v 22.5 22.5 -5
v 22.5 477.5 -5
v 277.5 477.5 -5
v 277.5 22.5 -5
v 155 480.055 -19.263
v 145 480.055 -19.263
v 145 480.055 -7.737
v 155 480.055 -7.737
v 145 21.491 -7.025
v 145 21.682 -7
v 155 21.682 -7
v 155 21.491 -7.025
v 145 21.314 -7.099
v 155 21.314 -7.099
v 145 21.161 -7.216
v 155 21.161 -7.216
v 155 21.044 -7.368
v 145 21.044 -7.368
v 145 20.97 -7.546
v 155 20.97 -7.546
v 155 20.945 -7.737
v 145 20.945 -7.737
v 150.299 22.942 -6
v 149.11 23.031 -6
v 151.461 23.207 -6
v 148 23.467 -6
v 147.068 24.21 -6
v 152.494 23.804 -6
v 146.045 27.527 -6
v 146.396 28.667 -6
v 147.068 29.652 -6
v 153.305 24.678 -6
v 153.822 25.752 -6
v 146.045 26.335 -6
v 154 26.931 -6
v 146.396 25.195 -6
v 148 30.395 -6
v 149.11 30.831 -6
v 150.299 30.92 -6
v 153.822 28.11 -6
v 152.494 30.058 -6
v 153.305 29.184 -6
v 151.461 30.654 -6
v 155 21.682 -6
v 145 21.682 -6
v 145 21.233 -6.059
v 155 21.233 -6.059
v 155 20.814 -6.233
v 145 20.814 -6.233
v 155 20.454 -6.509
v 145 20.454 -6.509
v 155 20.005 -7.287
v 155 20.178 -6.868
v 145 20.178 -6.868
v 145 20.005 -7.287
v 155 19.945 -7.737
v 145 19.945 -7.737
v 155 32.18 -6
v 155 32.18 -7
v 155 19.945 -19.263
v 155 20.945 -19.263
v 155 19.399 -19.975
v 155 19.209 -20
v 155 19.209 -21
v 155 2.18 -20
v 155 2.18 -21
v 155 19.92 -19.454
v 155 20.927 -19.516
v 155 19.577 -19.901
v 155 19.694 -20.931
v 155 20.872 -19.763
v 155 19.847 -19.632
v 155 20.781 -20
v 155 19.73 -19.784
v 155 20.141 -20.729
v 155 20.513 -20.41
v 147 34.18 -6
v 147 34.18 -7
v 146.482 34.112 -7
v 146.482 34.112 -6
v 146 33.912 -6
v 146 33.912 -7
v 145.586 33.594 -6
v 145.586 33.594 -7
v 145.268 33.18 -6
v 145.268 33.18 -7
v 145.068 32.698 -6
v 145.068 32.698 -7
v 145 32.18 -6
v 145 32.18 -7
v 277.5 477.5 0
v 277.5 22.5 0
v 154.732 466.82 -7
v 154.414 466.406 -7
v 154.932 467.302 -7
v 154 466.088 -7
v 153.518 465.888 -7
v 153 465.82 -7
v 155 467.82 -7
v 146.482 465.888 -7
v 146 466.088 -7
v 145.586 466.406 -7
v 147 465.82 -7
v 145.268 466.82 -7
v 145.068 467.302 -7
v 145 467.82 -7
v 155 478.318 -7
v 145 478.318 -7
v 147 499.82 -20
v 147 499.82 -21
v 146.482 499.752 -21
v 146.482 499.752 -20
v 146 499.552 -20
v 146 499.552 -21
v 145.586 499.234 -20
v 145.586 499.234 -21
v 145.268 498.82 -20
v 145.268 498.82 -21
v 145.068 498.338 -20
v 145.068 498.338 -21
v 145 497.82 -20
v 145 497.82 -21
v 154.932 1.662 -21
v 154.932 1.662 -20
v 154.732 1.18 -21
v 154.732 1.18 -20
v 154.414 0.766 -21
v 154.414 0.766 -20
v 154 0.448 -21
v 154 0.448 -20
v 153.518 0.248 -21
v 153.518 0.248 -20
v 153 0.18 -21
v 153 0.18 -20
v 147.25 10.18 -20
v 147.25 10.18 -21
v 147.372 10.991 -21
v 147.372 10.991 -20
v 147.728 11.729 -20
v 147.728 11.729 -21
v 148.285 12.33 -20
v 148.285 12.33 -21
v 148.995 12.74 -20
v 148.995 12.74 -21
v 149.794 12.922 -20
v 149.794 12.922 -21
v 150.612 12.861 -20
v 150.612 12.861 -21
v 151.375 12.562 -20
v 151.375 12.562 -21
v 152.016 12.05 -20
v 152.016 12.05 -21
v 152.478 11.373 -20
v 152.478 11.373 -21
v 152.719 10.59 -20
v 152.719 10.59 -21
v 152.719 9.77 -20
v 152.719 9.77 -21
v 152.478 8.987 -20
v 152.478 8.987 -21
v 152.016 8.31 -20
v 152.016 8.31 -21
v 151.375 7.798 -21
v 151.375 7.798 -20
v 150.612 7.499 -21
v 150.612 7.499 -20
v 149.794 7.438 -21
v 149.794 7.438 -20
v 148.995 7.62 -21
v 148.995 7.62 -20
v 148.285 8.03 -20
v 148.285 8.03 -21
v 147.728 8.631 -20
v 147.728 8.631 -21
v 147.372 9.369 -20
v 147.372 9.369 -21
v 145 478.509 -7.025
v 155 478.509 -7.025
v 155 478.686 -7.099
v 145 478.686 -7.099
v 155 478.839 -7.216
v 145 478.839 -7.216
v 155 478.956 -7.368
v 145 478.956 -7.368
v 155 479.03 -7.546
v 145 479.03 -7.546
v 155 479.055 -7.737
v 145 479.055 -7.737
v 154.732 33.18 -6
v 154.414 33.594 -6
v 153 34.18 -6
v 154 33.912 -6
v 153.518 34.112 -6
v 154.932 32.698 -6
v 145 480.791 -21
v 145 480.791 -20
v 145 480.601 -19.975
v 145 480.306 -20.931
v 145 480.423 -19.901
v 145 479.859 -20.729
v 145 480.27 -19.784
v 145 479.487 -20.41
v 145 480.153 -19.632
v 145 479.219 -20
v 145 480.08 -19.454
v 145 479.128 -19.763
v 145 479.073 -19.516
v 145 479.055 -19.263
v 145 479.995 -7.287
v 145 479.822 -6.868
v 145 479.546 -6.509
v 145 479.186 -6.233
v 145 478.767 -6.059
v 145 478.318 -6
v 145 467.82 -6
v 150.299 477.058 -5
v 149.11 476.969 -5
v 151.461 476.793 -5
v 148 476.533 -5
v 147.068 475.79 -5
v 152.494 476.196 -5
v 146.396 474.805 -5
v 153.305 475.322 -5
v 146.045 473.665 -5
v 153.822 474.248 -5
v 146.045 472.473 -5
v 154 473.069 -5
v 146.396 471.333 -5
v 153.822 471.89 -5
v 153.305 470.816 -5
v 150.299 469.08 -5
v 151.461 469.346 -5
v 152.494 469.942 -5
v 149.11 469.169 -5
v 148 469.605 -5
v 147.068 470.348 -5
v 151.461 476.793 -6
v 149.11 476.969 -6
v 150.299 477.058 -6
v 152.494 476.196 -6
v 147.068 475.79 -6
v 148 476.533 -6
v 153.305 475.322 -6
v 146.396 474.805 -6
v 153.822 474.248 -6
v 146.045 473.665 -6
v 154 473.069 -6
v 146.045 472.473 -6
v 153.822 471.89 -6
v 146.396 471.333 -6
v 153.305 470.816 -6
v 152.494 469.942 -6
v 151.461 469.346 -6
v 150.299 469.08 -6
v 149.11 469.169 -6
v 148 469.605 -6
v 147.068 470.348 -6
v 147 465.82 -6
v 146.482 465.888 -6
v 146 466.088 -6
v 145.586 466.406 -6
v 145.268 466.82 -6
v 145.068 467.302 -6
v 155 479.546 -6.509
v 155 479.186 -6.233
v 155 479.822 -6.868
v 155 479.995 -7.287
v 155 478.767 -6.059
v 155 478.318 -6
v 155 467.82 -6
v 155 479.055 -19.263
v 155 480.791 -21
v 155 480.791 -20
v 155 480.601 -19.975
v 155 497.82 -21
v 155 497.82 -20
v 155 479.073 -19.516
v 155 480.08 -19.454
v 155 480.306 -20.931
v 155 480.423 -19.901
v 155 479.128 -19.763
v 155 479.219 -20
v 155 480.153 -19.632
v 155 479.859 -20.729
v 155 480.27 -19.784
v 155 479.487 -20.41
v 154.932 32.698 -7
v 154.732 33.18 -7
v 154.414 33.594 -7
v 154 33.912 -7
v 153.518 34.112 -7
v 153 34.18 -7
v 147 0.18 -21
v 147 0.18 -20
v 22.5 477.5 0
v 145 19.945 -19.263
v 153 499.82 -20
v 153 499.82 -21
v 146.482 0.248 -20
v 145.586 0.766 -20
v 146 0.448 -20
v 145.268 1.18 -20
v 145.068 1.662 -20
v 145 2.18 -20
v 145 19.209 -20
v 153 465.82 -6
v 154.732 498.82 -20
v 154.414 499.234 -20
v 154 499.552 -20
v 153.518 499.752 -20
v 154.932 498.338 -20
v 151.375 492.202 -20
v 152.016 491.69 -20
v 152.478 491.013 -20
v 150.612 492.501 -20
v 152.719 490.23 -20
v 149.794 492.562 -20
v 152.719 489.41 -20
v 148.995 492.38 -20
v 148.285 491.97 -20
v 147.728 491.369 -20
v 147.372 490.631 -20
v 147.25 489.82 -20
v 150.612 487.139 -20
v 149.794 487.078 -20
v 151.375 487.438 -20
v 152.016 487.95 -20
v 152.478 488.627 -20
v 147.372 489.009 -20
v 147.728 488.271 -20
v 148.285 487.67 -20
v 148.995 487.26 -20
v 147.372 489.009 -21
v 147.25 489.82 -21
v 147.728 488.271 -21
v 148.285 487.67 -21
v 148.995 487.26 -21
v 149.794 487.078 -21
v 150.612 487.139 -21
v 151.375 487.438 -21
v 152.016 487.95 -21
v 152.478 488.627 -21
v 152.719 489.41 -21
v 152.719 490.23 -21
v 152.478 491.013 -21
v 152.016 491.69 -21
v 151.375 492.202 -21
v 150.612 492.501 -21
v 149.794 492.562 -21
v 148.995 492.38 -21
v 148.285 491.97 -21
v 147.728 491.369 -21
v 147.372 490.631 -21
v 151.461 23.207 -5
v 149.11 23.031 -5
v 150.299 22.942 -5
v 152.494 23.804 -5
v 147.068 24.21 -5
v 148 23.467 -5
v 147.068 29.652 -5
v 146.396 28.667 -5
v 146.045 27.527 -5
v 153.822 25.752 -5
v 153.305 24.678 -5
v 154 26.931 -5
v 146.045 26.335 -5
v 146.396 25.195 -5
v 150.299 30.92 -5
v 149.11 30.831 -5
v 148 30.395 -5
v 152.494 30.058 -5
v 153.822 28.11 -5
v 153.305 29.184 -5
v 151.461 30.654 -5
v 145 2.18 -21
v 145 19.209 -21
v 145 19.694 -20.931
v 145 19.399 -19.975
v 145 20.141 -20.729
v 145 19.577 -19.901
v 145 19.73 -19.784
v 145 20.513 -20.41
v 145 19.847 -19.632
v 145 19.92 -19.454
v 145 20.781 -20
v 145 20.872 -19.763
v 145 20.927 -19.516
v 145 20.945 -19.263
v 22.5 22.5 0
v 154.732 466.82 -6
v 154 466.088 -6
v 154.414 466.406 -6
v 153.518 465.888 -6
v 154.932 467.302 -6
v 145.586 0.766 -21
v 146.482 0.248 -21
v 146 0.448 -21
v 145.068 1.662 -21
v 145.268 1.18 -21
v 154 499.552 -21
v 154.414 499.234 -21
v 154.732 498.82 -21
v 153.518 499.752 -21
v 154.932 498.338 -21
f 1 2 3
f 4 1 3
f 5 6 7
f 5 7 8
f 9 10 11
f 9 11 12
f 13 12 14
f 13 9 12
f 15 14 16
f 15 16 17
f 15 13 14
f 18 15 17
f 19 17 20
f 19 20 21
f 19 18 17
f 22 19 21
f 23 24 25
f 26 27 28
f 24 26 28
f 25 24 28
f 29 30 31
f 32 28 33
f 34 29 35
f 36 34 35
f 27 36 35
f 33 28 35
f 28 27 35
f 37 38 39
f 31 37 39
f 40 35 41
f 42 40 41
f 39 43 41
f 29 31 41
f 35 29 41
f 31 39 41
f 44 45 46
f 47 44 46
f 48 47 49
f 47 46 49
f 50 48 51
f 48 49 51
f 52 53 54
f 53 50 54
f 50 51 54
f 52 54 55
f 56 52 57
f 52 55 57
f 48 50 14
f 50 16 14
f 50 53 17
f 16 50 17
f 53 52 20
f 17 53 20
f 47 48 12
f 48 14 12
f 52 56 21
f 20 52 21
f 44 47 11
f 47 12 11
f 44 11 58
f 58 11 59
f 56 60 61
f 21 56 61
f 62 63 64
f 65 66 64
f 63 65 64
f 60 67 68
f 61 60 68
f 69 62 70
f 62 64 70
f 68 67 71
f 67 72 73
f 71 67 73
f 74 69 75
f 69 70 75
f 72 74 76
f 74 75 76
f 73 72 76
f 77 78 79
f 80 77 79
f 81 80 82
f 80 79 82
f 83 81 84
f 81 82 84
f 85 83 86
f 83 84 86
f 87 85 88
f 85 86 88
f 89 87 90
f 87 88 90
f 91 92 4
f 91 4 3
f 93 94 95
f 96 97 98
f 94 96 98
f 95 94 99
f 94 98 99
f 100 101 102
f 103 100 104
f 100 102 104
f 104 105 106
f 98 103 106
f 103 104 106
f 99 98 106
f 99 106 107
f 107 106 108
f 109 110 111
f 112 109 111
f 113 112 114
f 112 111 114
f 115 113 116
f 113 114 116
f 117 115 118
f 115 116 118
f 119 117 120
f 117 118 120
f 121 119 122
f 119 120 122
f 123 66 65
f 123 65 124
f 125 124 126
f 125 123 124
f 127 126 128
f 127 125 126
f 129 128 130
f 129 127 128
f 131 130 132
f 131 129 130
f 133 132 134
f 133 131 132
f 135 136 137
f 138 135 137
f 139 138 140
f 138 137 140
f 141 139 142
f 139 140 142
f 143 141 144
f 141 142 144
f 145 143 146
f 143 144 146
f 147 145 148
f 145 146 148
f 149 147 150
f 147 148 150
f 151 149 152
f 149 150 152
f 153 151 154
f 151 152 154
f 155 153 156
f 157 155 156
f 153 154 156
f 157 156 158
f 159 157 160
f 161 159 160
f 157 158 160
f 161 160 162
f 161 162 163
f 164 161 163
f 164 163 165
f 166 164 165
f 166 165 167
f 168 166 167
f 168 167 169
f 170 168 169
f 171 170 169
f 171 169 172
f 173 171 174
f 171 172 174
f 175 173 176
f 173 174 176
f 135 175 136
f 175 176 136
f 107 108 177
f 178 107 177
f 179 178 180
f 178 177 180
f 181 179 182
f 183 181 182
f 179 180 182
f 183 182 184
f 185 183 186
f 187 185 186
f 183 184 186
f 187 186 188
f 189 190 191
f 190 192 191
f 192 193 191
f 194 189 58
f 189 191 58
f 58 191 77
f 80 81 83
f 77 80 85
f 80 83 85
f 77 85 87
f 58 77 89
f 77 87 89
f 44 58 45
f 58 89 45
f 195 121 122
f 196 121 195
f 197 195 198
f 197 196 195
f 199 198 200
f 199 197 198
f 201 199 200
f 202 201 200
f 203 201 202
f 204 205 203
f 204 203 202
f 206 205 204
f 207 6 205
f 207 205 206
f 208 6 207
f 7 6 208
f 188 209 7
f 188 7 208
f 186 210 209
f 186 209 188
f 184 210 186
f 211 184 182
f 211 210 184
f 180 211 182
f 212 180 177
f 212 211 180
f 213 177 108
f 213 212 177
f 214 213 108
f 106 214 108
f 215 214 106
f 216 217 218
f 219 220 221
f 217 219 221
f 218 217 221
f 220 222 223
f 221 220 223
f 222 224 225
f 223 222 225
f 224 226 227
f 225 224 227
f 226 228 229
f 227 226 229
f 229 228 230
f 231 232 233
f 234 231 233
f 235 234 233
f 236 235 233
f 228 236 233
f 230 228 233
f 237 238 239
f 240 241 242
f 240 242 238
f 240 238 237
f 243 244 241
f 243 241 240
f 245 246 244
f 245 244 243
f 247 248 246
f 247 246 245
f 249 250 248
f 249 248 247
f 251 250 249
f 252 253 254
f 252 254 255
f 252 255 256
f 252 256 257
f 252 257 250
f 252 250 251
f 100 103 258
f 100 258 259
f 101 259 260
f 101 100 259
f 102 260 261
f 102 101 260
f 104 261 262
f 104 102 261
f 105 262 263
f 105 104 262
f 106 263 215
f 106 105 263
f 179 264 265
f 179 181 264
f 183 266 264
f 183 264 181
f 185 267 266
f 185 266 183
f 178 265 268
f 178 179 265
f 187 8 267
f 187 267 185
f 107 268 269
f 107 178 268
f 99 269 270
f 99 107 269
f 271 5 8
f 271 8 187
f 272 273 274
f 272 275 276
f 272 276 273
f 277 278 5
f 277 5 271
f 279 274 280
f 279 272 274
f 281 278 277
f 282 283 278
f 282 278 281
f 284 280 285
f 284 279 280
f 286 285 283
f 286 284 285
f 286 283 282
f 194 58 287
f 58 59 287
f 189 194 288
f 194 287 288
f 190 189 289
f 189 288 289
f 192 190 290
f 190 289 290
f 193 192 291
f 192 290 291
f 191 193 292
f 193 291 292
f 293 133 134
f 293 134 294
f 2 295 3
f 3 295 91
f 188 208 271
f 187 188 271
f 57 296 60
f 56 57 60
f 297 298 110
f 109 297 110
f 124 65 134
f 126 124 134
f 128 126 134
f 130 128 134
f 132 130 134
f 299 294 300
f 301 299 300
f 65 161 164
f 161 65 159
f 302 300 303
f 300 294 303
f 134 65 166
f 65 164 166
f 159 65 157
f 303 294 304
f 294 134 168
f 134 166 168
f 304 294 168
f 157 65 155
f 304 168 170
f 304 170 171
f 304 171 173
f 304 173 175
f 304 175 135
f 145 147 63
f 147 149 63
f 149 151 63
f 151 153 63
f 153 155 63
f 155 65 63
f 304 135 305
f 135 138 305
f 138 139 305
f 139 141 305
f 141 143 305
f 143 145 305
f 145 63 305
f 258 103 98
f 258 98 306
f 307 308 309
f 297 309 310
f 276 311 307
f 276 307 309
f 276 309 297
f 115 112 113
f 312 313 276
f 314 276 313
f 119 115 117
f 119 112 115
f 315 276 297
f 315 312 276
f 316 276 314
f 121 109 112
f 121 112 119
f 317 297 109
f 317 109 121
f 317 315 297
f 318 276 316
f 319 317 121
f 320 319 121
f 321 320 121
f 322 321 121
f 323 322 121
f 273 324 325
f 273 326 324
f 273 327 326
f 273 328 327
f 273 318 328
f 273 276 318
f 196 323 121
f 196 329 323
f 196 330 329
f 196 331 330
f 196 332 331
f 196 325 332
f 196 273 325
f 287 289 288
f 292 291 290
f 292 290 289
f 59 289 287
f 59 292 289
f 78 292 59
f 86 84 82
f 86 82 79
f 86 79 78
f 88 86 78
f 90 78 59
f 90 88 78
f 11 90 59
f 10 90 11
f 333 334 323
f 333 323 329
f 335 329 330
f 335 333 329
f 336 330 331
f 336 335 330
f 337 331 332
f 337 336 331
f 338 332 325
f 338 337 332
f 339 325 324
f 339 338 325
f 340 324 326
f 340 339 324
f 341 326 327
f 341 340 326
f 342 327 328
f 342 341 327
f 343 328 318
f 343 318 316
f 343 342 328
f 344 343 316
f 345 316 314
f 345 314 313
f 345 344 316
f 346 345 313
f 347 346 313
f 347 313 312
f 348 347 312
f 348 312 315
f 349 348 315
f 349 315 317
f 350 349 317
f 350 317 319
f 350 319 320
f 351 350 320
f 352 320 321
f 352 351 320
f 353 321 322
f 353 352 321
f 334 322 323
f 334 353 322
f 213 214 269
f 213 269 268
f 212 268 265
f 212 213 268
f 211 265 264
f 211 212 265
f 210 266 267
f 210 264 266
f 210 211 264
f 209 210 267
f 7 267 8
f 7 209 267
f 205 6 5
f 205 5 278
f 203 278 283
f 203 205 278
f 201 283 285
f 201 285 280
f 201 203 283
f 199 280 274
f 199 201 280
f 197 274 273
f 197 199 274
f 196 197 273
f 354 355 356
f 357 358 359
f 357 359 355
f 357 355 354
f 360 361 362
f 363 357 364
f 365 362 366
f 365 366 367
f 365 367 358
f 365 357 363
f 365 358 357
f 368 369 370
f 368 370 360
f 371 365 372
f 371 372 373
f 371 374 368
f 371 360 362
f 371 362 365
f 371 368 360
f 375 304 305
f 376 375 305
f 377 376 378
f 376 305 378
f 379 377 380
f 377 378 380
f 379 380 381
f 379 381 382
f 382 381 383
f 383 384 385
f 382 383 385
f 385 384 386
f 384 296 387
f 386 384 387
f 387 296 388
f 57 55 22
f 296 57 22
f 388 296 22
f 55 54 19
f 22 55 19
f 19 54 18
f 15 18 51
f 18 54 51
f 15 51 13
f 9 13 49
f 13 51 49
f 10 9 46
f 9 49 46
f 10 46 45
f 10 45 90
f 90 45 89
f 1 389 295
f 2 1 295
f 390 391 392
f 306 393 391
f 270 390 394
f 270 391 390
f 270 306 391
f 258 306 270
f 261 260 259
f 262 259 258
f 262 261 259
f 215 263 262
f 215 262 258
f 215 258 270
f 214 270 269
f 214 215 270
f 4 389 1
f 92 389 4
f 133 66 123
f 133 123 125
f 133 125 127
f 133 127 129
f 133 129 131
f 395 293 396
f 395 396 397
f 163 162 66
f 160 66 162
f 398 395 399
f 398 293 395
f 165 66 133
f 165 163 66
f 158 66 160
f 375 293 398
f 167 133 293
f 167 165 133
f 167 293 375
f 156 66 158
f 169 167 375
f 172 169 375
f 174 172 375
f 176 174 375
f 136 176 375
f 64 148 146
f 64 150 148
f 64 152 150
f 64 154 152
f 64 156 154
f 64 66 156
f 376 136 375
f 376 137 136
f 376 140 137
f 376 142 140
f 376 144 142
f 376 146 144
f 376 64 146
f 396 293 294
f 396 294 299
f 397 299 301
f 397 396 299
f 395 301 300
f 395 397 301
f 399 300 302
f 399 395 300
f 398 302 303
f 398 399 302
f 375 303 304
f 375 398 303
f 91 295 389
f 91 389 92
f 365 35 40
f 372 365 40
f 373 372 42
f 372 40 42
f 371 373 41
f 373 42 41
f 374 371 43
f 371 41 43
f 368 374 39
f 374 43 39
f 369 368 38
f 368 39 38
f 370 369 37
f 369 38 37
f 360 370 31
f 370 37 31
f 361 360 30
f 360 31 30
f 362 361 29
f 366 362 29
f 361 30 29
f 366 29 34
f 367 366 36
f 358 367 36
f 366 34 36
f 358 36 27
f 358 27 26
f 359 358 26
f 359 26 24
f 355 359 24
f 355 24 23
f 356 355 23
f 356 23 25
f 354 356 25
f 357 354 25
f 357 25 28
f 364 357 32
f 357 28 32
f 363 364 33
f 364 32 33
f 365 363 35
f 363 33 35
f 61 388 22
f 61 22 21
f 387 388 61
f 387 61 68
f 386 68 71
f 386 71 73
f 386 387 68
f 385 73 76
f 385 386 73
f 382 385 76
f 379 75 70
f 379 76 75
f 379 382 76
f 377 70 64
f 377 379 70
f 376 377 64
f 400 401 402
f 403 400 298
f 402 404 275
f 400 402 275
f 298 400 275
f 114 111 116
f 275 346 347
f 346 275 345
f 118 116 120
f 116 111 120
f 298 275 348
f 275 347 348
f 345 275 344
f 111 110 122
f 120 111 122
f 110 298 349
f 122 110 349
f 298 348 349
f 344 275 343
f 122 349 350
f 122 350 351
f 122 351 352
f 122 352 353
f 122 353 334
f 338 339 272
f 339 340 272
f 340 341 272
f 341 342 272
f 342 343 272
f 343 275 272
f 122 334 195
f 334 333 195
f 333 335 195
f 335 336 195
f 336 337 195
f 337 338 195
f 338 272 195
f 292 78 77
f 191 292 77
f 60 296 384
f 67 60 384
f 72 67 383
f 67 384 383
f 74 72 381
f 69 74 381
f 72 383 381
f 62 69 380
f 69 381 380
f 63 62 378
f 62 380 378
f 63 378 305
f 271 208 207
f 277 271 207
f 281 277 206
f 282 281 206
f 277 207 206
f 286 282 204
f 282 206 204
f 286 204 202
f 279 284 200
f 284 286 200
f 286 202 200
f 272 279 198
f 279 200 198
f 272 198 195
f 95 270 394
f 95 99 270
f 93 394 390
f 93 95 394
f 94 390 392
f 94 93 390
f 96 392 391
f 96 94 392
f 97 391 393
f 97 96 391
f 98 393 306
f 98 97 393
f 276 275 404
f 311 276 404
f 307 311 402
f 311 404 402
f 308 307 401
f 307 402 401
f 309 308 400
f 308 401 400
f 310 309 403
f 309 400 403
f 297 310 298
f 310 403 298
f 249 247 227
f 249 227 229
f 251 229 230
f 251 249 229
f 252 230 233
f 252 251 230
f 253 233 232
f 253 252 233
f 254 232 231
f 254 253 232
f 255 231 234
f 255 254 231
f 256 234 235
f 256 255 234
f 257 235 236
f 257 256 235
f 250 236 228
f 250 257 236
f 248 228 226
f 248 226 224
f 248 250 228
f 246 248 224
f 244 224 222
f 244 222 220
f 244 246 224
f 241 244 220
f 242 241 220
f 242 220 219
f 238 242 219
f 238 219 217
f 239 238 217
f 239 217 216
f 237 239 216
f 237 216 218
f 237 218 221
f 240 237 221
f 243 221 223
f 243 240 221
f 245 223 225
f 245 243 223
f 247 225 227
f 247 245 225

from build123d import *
from build123d.topology import SkipClean

# Parameters (mm, degrees)
SKETCH1_W           = 255
SKETCH1_H           = 455
BOSS_EXTRUDE1_DEPTH = 5
SKETCH2_R           = 2.75
BASE_FLANGE1_DEPTH  = 1
JOG1_START          = 145
JOG1_DEPTH          = 10
JOG1_START_2        = 147
JOG1_2_DEPTH        = 6
JOG1_START_3        = -7.7366
JOG1_3_DEPTH        = 1.716372919
JOG1_START_4        = -20
JOG1_4_OUTLINE_W    = 2
JOG1_4_OUTLINE_H    = 1
JOG1_4_DEPTH        = 12.381759831
JOG1_START_5        = -7
JOG1_5_DEPTH        = 1
JOG1_6_DEPTH        = 10
JOG1_7_DEPTH        = 10
SKETCH8_R           = 4
BOSS_EXTRUDE2_DEPTH = 1


with BuildPart() as part:
    # Sketch1 → Boss-Extrude1 (new body)
    with BuildSketch(Plane.XY):
        with Locations((150, 250)):
            Rectangle(SKETCH1_W, SKETCH1_H)
    extrude(amount=-BOSS_EXTRUDE1_DEPTH)


with BuildPart() as body_2:
    # Base-Flange1: sheet metal written as solids
    # Sketch2 → Base-Flange1 (new body)
    with BuildSketch(Plane(origin=(0, 0, -21), x_dir=(-1, 0, 0), z_dir=(0, 0, -1))):
        with BuildLine():
            Line((-153, 0.18), (-147, 0.18))
            ThreePointArc((-147, 0.18), (-145.585786438, 0.765786438), (-145, 2.18))
            Line((-145, 2.18), (-145, 32.18))
            ThreePointArc((-145, 32.18), (-145.585786438, 33.594213562), (-147, 34.18))
            Line((-147, 34.18), (-153, 34.18))
            ThreePointArc((-153, 34.18), (-154.414213562, 33.594213562), (-155, 32.18))
            Line((-155, 32.18), (-155, 2.18))
            ThreePointArc((-155, 2.18), (-154.414213562, 0.765786438), (-153, 0.18))
        make_face()
        with Locations((-150, 10.18)):
            Circle(SKETCH2_R, mode=Mode.SUBTRACT)
    extrude(amount=-BASE_FLANGE1_DEPTH)

    # Jog1: read off the stored shape, not the designer's step
    # Jog1 outline → Jog1 (cut)
    with BuildSketch(Plane.YZ.offset(JOG1_START)):
        with BuildLine():
            Line((34.18, -20), (20.781417721, -20))
            ThreePointArc((20.781417721, -20), (20.140602795, -20.728828115), (19.208776631, -21))
            Line((19.208776631, -21), (34.18, -21))
            Line((34.18, -21), (34.18, -20))
        make_face()
    extrude(amount=JOG1_DEPTH, mode=Mode.SUBTRACT)

    # Jog1 2 outline → Jog1 2 (add)
    with BuildSketch(Plane.YZ.offset(JOG1_START_2)):
        with BuildLine():
            ThreePointArc((20.781417721, -20), (20.903891388, -19.640713558), (20.945376631, -19.2634))
            Line((20.945376631, -19.2634), (20.945376631, -7.7366))
            ThreePointArc((20.945376631, -7.7366), (21.161121776, -7.215745145), (21.681976631, -7))
            Line((21.681976631, -7), (34.18, -7))
            Line((34.18, -7), (34.18, -6))
            Line((34.18, -6), (21.681976631, -6))
            ThreePointArc((21.681976631, -6), (20.454014995, -6.508638364), (19.945376631, -7.7366))
            Line((19.945376631, -7.7366), (19.945376631, -19.2634))
            ThreePointArc((19.945376631, -19.2634), (19.729631486, -19.784254855), (19.208776631, -20))
            Line((19.208776631, -20), (20.781417721, -20))
        make_face()
    extrude(amount=JOG1_2_DEPTH)

    # Jog1 3 outline → Jog1 3 (add)
    with BuildSketch(Plane.XY.offset(JOG1_START_3)):
        with BuildLine():
            Line((155, 19.945376631), (155, 32.18))
            ThreePointArc((155, 32.18), (154.414213562, 33.594213562), (153, 34.18))
            Line((153, 34.18), (153, 19.945376631))
            Line((153, 19.945376631), (155, 19.945376631))
        make_face()
        with BuildLine():
            Line((147, 19.945376631), (147, 34.18))
            ThreePointArc((147, 34.18), (145.585786438, 33.594213562), (145, 32.18))
            Line((145, 32.18), (145, 19.945376631))
            Line((145, 19.945376631), (147, 19.945376631))
        make_face()
    extrude(amount=JOG1_3_DEPTH)

    # Jog1 4 outline → Jog1 4 (add)
    with BuildSketch(Plane.XY.offset(JOG1_START_4)):
        with Locations((154, 20.445376631)):
            Rectangle(JOG1_4_OUTLINE_W, JOG1_4_OUTLINE_H)
        with Locations((146, 20.445376631)):
            Rectangle(JOG1_4_OUTLINE_W, JOG1_4_OUTLINE_H)
    extrude(amount=JOG1_4_DEPTH)

    # Jog1 5 outline → Jog1 5 (add)
    with BuildSketch(Plane.XY.offset(JOG1_START_5)):
        with BuildLine():
            Line((153, 20.945376631), (155, 20.945376631))
            Line((155, 20.945376631), (155, 32.18))
            ThreePointArc((155, 32.18), (154.414213562, 33.594213562), (153, 34.18))
            Line((153, 34.18), (153, 20.945376631))
        make_face()
        with BuildLine():
            Line((145, 20.945376631), (147, 20.945376631))
            Line((147, 20.945376631), (147, 34.18))
            ThreePointArc((147, 34.18), (145.585786438, 33.594213562), (145, 32.18))
            Line((145, 32.18), (145, 20.945376631))
        make_face()
    extrude(amount=JOG1_5_DEPTH)

    # Jog1 6 outline → Jog1 6 (cut)
    with SkipClean():  # the faces are left unmerged after this step: merging them gives an invalid solid
        with BuildSketch(Plane.YZ.offset(JOG1_START)):
            with BuildLine():
                Line((19.945376631, -6.020227081), (19.945376631, -7.7366))
                ThreePointArc((19.945376631, -7.7366), (20.454014995, -6.508638364), (21.681976631, -6))
                Line((21.681976631, -6), (36, -5.999999994))
                Line((36, -5.999999994), (36, -5))
                Line((36, -5), (20.945376637, -5))
                Line((20.945376637, -5), (20.945376637, -6))
                Line((20.945376637, -6), (20.945376631, -6.020227081))
                Line((20.945376631, -6.020227081), (19.945376631, -6.020227081))
            make_face()
            with BuildLine():
                ThreePointArc((20.781417721, -20), (20.436738266, -20.491361637), (19.945376629, -20.836041092))
                Line((19.945376629, -20.836041092), (19.945376626, -21))
                Line((19.945376626, -21), (36, -21))
                Line((36, -21), (36, -7))
                Line((36, -7), (21.681976631, -7))
                ThreePointArc((21.681976631, -7), (21.161121776, -7.215745145), (20.945376631, -7.7366))
                Line((20.945376631, -7.7366), (20.945376631, -19.2634))
                ThreePointArc((20.945376631, -19.2634), (20.903891388, -19.640713558), (20.781417721, -20))
            make_face()
        extrude(amount=JOG1_6_DEPTH, mode=Mode.SUBTRACT)
    add(body_2.part.scale(1), mode=Mode.REPLACE)  # the faces are merged on a copy

    # Jog1 7 outline → Jog1 7 (add)
    with BuildSketch(Plane.YZ.offset(JOG1_START)):
        with BuildLine():
            Line((19.945376631, -20), (19.945376631, -19.2634))
            ThreePointArc((19.945376631, -19.2634), (19.729631486, -19.784254855), (19.208776631, -20))
            Line((19.208776631, -20), (18, -20))
            Line((18, -20), (18, -21))
            Line((18, -21), (19.208776631, -21))
            ThreePointArc((19.208776631, -21), (19.586090188, -20.958514757), (19.945376629, -20.836041092))
            Line((19.945376629, -20.836041092), (19.945376631, -20))
        make_face()
    extrude(amount=JOG1_7_DEPTH)


with BuildPart() as body_3:
    # Sketch8 → Boss-Extrude2 (new body)
    with BuildSketch(Plane.XY.offset(-6)):
        with Locations((150, 26.930988316)):
            Circle(SKETCH8_R)
    extrude(amount=BOSS_EXTRUDE2_DEPTH)


with BuildPart() as body_4:
    # Mirror1: mirrored copy
    add(body_2.part.mirror(Plane.ZX.offset(250)))


with BuildPart() as body_5:
    # Mirror1 2: mirrored copy
    add(body_3.part.mirror(Plane.ZX.offset(250)))


solid = Compound([part.part, body_2.part, body_3.part, body_4.part, body_5.part])
